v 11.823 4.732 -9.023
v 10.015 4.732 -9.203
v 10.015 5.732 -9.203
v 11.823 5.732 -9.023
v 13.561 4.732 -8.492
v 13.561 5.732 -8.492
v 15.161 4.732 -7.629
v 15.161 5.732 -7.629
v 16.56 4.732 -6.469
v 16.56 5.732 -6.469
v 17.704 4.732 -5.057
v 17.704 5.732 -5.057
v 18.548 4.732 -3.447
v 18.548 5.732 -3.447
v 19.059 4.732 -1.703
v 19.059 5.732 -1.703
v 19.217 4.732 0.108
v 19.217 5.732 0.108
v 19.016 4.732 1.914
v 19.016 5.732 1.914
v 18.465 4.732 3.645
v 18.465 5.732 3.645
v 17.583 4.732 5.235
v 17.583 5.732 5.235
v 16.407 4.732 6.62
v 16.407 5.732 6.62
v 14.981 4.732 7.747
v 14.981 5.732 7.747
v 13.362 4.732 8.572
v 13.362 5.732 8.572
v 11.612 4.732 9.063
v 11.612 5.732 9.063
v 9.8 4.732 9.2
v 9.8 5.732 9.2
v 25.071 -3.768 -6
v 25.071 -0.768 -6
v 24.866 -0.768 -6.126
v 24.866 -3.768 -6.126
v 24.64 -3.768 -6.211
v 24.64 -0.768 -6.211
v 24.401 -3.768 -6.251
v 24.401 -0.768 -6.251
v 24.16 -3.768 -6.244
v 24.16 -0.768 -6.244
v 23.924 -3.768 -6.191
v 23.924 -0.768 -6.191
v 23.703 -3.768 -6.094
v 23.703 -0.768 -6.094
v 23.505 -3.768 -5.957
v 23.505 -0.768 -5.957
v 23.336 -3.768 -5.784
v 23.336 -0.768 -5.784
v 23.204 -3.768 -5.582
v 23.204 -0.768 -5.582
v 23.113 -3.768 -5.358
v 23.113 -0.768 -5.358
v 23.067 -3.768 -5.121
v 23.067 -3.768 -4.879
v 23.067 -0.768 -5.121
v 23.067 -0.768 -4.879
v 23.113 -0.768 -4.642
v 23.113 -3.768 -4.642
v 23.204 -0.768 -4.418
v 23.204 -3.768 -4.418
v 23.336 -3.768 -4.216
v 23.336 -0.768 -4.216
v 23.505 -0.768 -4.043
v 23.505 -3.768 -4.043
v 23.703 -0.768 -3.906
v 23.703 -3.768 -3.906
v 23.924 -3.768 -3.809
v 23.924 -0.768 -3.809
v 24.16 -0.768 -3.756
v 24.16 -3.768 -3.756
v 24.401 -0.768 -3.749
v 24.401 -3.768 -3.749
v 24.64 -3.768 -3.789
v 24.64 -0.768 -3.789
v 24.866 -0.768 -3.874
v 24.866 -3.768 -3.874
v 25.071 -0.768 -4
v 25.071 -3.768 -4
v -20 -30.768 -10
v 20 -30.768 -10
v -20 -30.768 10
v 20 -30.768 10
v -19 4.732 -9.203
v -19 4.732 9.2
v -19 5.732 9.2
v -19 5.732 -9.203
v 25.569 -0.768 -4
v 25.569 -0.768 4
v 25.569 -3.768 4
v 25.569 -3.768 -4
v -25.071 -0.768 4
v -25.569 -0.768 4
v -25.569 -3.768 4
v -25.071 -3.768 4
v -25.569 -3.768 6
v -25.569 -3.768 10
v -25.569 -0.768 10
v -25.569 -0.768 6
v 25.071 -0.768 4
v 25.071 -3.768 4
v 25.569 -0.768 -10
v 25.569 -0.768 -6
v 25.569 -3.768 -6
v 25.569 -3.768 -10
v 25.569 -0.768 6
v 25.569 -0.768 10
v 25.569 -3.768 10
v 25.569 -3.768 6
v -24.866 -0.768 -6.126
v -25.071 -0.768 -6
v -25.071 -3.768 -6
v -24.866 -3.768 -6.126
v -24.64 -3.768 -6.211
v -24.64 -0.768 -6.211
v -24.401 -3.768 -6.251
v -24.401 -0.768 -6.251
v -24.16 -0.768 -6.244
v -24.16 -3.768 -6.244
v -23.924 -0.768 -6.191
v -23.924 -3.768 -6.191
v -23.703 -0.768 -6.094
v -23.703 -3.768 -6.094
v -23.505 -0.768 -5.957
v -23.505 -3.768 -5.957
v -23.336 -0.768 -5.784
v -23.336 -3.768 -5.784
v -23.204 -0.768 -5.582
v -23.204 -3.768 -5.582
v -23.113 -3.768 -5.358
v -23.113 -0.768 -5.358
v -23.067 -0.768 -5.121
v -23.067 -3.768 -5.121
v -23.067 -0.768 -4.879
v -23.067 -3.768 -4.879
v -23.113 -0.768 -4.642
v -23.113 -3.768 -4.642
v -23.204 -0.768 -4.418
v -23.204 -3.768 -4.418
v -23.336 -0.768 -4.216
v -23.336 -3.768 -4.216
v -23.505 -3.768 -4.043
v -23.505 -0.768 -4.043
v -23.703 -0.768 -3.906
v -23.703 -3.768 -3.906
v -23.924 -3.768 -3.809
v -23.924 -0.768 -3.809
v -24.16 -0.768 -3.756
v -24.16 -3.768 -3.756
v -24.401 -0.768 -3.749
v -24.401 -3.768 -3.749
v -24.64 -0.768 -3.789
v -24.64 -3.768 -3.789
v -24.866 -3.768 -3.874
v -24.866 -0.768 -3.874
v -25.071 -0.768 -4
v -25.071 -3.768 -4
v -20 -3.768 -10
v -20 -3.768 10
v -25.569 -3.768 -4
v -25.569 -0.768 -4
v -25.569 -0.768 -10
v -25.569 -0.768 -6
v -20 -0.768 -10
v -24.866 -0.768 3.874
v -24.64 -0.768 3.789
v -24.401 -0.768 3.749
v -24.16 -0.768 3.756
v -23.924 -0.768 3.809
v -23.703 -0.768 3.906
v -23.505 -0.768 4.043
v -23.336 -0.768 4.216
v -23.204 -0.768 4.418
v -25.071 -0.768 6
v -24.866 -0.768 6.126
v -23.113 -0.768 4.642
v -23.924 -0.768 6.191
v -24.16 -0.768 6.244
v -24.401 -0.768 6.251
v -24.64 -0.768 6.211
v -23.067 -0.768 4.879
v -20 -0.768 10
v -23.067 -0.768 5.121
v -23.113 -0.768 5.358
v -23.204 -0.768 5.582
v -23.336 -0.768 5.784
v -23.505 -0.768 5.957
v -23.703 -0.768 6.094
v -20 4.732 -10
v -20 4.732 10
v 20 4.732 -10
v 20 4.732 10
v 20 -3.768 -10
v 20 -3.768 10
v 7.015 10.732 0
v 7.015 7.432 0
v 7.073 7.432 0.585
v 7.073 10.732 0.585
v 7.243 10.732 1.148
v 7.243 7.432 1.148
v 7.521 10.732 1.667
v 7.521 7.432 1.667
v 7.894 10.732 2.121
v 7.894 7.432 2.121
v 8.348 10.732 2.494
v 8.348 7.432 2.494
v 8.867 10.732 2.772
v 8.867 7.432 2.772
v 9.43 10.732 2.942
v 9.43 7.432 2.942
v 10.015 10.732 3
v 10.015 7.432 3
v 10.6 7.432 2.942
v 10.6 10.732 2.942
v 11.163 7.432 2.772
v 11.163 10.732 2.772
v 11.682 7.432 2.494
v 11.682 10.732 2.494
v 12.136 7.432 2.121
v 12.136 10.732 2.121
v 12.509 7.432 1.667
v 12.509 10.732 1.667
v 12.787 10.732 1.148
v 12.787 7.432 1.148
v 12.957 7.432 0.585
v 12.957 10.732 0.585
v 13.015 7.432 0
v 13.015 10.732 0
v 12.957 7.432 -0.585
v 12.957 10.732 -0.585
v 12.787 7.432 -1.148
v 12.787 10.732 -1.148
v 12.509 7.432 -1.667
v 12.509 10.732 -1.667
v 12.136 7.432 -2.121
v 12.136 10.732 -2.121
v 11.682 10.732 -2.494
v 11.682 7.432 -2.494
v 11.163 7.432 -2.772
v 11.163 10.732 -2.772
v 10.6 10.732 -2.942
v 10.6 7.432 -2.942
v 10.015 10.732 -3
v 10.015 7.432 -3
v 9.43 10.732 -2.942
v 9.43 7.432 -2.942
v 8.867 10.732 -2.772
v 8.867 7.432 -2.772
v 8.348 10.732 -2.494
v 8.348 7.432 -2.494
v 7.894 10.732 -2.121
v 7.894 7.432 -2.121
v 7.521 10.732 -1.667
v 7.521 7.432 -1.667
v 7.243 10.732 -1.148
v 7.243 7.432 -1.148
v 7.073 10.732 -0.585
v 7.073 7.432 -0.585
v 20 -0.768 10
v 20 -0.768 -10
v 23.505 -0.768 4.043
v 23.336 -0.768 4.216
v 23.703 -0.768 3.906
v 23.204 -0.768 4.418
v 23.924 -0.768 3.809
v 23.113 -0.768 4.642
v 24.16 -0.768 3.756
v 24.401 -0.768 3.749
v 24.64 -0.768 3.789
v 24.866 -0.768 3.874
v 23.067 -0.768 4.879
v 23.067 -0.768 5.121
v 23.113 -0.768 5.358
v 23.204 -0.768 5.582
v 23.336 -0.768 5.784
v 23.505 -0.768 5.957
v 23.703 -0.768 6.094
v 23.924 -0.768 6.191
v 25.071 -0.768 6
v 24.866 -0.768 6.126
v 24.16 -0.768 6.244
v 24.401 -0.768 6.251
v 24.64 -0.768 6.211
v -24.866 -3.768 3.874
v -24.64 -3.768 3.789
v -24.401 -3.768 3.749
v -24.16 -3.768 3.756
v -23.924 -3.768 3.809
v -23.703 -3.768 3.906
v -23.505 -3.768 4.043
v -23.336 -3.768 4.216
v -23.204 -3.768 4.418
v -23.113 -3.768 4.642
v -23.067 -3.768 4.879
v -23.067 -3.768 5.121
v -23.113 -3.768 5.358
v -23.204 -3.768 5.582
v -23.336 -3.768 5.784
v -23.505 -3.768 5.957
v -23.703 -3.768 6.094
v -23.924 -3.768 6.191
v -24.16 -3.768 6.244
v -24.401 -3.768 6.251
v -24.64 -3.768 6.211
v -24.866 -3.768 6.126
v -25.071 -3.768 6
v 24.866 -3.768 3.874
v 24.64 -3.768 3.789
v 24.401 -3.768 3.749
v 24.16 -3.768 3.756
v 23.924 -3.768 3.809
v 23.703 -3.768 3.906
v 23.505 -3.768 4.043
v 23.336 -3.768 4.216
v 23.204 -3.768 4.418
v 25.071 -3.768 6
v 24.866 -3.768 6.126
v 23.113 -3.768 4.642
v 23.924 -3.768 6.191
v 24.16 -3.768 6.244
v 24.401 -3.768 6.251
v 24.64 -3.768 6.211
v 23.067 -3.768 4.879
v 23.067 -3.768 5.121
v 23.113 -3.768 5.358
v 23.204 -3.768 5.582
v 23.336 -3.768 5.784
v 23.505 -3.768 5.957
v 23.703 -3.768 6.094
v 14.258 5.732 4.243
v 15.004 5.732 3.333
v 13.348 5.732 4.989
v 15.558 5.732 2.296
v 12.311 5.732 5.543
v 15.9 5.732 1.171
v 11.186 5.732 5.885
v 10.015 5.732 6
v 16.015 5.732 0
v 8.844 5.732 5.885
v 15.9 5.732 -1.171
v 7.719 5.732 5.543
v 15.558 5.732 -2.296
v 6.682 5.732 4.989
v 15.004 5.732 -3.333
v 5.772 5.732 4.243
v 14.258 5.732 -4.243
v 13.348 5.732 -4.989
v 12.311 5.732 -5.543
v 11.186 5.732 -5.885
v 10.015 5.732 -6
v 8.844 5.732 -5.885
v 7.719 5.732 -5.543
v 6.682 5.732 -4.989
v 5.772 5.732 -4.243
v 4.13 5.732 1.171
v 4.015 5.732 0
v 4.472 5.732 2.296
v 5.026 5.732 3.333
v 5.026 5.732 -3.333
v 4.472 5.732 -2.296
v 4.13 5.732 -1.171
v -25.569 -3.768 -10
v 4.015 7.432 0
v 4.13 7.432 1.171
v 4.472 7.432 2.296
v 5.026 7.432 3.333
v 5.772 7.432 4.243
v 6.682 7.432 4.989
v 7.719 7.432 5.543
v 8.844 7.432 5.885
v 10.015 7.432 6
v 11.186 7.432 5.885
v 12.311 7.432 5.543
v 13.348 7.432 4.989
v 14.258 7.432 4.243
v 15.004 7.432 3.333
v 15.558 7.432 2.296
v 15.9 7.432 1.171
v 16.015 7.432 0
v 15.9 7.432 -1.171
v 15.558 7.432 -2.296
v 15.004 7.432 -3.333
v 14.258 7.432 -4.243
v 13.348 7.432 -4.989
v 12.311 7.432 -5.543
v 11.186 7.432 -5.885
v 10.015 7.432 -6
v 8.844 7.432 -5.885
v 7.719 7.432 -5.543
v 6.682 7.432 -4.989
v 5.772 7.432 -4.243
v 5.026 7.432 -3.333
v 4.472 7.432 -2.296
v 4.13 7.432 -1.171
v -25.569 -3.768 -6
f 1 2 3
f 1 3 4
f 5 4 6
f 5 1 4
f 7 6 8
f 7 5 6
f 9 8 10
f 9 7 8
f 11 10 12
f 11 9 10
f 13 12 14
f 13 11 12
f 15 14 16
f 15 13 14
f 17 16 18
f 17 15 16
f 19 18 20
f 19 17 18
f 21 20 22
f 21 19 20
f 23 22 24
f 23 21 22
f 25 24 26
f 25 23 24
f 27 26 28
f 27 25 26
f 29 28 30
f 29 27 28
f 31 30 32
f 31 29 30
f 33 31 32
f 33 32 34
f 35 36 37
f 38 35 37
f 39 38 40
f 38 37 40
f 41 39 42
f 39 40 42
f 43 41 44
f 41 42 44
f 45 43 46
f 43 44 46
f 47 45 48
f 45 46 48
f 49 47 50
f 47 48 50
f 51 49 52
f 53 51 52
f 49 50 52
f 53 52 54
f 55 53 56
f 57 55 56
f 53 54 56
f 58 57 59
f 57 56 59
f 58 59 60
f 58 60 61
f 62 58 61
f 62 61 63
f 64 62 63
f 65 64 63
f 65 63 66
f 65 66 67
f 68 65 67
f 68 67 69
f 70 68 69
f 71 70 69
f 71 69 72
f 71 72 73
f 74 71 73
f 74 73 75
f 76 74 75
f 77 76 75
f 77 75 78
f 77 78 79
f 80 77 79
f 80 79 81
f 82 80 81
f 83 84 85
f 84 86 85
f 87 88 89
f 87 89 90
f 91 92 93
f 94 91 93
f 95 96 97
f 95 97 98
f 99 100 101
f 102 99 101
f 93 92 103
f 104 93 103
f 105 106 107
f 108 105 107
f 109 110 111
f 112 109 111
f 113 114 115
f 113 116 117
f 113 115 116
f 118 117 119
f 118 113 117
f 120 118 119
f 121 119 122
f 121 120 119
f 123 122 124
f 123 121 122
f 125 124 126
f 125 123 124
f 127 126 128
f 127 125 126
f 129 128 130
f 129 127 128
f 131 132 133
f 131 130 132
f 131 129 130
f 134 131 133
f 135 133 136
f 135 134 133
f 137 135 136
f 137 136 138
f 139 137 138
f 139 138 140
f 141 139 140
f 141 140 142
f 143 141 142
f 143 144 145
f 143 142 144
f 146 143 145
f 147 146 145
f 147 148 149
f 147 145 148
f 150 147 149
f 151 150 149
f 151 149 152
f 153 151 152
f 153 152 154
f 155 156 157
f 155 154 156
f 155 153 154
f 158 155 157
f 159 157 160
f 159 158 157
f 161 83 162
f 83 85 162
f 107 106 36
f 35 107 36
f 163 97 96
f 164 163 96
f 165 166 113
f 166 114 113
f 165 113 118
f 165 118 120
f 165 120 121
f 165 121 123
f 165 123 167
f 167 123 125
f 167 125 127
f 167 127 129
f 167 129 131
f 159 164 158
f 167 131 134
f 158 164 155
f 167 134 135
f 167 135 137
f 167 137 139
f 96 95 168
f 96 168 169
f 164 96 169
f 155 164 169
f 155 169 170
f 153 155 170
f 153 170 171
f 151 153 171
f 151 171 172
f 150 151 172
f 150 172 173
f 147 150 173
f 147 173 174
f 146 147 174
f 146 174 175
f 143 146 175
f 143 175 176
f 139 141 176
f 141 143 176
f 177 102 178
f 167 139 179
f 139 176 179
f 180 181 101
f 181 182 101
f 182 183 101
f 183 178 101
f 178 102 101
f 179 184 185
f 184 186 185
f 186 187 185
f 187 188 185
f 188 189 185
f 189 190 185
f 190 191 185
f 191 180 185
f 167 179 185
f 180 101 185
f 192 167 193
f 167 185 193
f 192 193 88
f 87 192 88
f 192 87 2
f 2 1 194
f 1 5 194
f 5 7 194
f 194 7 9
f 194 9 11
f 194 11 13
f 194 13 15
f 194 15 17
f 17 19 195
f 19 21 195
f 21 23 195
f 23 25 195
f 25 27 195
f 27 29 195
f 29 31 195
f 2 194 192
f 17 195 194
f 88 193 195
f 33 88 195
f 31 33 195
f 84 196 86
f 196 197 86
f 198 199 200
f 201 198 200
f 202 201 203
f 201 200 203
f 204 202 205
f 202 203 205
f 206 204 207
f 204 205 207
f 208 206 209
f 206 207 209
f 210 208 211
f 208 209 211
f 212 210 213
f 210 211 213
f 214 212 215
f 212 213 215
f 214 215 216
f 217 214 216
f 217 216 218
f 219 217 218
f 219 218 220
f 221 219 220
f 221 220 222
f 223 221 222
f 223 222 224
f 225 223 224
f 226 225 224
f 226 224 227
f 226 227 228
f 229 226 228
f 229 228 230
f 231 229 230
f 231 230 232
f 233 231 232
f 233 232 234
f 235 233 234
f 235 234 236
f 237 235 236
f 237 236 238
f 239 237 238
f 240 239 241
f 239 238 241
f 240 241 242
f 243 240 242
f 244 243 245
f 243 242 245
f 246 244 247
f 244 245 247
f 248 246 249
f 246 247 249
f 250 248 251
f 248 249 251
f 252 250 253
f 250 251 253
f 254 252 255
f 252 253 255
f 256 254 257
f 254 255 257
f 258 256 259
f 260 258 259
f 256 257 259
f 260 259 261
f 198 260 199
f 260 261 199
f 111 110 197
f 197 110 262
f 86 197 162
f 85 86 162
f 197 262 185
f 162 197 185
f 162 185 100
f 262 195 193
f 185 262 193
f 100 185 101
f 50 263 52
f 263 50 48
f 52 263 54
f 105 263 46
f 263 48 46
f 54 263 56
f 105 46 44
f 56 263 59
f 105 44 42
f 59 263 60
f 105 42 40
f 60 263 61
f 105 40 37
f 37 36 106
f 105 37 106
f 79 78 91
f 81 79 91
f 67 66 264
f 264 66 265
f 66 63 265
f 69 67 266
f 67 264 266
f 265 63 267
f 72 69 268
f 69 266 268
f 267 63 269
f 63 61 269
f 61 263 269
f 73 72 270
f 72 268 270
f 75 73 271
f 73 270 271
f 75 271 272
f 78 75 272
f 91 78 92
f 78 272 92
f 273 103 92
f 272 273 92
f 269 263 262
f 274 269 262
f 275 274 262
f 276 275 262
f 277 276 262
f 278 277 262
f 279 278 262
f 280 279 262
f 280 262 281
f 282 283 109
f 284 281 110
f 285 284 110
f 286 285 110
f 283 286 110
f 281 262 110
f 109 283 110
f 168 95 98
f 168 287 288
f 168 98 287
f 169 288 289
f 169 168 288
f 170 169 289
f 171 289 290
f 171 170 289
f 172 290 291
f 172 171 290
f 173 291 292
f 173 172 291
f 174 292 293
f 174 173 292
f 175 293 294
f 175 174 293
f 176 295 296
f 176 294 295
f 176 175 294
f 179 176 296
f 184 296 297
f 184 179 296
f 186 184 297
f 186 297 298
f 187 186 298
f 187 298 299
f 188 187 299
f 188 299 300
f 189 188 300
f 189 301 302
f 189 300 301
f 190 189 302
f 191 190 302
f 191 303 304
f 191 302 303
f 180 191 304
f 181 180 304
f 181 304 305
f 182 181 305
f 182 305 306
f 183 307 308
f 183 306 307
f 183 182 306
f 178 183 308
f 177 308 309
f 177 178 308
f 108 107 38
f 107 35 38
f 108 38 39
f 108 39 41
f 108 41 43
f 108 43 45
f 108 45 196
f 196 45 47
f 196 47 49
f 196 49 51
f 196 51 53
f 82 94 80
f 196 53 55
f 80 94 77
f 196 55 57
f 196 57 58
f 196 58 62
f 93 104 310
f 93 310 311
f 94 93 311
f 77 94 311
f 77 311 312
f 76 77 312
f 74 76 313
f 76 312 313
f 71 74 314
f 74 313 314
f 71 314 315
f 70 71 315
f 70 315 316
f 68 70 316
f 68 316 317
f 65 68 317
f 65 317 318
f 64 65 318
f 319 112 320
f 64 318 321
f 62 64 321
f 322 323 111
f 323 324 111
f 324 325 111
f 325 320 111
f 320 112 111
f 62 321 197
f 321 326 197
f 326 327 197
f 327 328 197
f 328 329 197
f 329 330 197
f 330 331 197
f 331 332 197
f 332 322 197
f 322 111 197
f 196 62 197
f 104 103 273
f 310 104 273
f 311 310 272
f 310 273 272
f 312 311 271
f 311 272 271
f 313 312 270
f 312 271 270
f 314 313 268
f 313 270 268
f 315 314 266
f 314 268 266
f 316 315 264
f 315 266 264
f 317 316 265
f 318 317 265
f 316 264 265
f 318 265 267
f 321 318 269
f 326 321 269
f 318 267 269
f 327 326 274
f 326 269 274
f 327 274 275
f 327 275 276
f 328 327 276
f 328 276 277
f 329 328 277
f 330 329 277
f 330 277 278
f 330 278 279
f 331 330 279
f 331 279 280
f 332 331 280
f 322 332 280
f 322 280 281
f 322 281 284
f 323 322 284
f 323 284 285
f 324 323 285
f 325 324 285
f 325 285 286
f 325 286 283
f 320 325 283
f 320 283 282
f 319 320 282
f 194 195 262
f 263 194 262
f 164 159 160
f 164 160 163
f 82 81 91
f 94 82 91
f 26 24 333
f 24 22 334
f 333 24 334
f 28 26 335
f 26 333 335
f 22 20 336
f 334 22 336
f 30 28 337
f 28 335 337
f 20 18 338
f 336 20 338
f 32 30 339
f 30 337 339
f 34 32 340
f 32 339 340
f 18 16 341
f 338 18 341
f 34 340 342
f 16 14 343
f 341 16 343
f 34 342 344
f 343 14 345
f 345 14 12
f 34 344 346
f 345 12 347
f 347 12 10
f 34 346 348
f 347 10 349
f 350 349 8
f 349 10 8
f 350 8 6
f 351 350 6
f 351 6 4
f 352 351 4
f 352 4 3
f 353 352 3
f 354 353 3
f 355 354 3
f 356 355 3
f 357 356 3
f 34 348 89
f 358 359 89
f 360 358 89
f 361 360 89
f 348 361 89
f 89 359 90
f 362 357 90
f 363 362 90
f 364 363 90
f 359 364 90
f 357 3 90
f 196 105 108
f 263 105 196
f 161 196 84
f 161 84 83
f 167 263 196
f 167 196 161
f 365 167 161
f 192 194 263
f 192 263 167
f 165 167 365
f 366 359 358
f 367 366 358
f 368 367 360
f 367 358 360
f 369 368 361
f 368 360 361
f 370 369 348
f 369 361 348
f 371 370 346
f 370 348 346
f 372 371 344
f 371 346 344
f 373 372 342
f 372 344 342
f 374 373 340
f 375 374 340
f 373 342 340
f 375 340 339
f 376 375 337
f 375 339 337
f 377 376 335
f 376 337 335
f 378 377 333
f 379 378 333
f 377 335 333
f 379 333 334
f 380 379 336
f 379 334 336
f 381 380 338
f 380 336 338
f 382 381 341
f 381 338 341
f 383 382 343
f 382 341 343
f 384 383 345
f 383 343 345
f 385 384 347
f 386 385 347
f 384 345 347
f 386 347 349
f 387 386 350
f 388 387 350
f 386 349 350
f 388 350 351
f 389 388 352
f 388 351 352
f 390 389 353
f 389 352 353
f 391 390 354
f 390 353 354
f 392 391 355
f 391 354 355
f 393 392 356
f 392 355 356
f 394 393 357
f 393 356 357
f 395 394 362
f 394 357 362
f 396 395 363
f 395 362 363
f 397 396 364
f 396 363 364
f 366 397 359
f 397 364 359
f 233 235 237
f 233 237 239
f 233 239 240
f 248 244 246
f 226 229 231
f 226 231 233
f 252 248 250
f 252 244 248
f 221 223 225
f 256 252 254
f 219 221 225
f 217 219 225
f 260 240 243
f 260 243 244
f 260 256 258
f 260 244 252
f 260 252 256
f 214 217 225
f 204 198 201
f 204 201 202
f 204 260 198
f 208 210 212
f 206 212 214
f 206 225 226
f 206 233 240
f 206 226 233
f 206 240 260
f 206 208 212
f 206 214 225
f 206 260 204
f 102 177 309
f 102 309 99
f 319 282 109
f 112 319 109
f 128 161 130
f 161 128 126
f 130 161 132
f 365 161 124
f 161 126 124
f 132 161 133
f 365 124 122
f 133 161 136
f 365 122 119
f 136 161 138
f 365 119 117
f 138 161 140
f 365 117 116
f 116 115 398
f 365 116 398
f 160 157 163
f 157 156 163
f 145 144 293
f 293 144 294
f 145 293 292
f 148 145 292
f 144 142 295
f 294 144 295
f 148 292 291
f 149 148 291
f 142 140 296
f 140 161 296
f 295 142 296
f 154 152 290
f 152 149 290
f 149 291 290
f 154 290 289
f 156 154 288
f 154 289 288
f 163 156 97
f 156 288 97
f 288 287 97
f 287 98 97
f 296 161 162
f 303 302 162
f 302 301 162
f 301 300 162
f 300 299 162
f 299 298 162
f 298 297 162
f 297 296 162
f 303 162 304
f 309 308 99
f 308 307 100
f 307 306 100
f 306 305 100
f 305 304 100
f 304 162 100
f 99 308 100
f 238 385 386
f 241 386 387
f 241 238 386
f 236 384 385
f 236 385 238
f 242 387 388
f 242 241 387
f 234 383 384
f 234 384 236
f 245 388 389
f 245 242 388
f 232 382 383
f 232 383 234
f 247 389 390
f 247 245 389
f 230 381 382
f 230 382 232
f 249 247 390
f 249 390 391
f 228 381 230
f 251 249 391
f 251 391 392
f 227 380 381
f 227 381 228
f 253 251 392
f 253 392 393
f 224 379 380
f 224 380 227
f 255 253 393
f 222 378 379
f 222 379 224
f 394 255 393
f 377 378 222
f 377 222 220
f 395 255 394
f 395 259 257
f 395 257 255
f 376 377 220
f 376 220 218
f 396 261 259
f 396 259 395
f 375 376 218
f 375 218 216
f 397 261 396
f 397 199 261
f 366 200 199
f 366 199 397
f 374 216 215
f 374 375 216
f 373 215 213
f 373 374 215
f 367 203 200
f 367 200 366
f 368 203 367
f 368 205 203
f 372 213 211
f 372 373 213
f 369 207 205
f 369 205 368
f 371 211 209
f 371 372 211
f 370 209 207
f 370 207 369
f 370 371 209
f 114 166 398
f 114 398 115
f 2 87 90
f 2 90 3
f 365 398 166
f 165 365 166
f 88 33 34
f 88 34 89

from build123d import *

# Parameters (mm, degrees)
RESSALTO_EXTRUS_O1_DEPTH = 10
CORTE_EXTRUS_O1_DEPTH    = 10
RESSALTO_EXTRUS_O2_DEPTH = 1
ESBO_O4_R                = 3
RESSALTO_EXTRUS_O3_DEPTH = 5
ESBO_O5_R                = 6
RESSALTO_EXTRUS_O4_DEPTH = 1.7


with BuildPart() as part:
    # Esboço1 → Ressalto-extrusão1 (new, symmetric)
    with BuildSketch(Plane.XY):
        Polygon((20, -0.767915455), (25.568877633, -0.767915455), (25.568877633, -3.767915455), (20, -3.767915455), (20, -30.767915455), (-20, -30.767915455), (-20, -3.767915455), (-25.568877633, -3.767915455), (-25.568877633, -0.767915455), (-20, -0.767915455), (-20, 4.732084545), (20, 4.732084545), align=None)
    extrude(amount=RESSALTO_EXTRUS_O1_DEPTH, both=True)

    # Esboço6 → Corte-extrusão1 (cut)
    with BuildSketch(Plane(origin=(0, -0.767915455, 0), x_dir=(1, 0, 0), z_dir=(0, 1, 0))):
        with BuildLine():
            Line((25.071445053, 4), (25.568877633, 4))
            Line((25.568877633, 4), (25.568877633, 6))
            Line((25.568877633, 6), (25.071445053, 6))
            ThreePointArc((25.071445053, 6), (23.061122367, 5), (25.071445053, 4))
        make_face()
        with BuildLine():
            Line((25.568877633, -6), (25.568877633, -4))
            Line((25.568877633, -4), (25.071445053, -4))
            ThreePointArc((25.071445053, -4), (23.061122367, -5), (25.071445053, -6))
            Line((25.071445053, -6), (25.568877633, -6))
        make_face()
        with BuildLine():
            ThreePointArc((-25.071445053, 6), (-23.061122367, 5), (-25.071445053, 4))
            Line((-25.071445053, 4), (-25.568877633, 4))
            Line((-25.568877633, 4), (-25.568877633, 6))
            Line((-25.568877633, 6), (-25.071445053, 6))
        make_face()
        with BuildLine():
            ThreePointArc((-25.071445053, -4), (-23.061122367, -5), (-25.071445053, -6))
            Line((-25.071445053, -6), (-25.568877633, -6))
            Line((-25.568877633, -6), (-25.568877633, -4))
            Line((-25.568877633, -4), (-25.071445053, -4))
        make_face()
    extrude(amount=-CORTE_EXTRUS_O1_DEPTH, mode=Mode.SUBTRACT)

    # Esboço3 → Ressalto-extrusão2 (add)
    with BuildSketch(Plane(origin=(0, 4.732084545, 0), x_dir=(1, 0, 0), z_dir=(0, 1, 0))):
        with BuildLine():
            Line((-19, 9.202511885), (10.015, 9.202511885))
            ThreePointArc((10.015, 9.202511885), (19.216883893, -0.107507336), (9.8, -9.2))
            Line((9.8, -9.2), (-19, -9.2))
            Line((-19, -9.2), (-19, 9.202511885))
        make_face()
    extrude(amount=RESSALTO_EXTRUS_O2_DEPTH)

    # Esboço4 → Ressalto-extrusão3 (add)
    with BuildSketch(Plane(origin=(0, 5.732084545, 0), x_dir=(1, 0, 0), z_dir=(0, 1, 0))):
        with Locations(Location((10.015, 0, 0), (0, 0, 180))):
            Circle(ESBO_O4_R)
    extrude(amount=RESSALTO_EXTRUS_O3_DEPTH)

    # Esboço5 → Ressalto-extrusão4 (add)
    with BuildSketch(Plane(origin=(0, 5.732084545, 0), x_dir=(1, 0, 0), z_dir=(0, 1, 0))):
        with Locations(Location((10.015, 0, 0), (0, 0, 180))):
            Circle(ESBO_O5_R)
    extrude(amount=RESSALTO_EXTRUS_O4_DEPTH)


solid = part.part
